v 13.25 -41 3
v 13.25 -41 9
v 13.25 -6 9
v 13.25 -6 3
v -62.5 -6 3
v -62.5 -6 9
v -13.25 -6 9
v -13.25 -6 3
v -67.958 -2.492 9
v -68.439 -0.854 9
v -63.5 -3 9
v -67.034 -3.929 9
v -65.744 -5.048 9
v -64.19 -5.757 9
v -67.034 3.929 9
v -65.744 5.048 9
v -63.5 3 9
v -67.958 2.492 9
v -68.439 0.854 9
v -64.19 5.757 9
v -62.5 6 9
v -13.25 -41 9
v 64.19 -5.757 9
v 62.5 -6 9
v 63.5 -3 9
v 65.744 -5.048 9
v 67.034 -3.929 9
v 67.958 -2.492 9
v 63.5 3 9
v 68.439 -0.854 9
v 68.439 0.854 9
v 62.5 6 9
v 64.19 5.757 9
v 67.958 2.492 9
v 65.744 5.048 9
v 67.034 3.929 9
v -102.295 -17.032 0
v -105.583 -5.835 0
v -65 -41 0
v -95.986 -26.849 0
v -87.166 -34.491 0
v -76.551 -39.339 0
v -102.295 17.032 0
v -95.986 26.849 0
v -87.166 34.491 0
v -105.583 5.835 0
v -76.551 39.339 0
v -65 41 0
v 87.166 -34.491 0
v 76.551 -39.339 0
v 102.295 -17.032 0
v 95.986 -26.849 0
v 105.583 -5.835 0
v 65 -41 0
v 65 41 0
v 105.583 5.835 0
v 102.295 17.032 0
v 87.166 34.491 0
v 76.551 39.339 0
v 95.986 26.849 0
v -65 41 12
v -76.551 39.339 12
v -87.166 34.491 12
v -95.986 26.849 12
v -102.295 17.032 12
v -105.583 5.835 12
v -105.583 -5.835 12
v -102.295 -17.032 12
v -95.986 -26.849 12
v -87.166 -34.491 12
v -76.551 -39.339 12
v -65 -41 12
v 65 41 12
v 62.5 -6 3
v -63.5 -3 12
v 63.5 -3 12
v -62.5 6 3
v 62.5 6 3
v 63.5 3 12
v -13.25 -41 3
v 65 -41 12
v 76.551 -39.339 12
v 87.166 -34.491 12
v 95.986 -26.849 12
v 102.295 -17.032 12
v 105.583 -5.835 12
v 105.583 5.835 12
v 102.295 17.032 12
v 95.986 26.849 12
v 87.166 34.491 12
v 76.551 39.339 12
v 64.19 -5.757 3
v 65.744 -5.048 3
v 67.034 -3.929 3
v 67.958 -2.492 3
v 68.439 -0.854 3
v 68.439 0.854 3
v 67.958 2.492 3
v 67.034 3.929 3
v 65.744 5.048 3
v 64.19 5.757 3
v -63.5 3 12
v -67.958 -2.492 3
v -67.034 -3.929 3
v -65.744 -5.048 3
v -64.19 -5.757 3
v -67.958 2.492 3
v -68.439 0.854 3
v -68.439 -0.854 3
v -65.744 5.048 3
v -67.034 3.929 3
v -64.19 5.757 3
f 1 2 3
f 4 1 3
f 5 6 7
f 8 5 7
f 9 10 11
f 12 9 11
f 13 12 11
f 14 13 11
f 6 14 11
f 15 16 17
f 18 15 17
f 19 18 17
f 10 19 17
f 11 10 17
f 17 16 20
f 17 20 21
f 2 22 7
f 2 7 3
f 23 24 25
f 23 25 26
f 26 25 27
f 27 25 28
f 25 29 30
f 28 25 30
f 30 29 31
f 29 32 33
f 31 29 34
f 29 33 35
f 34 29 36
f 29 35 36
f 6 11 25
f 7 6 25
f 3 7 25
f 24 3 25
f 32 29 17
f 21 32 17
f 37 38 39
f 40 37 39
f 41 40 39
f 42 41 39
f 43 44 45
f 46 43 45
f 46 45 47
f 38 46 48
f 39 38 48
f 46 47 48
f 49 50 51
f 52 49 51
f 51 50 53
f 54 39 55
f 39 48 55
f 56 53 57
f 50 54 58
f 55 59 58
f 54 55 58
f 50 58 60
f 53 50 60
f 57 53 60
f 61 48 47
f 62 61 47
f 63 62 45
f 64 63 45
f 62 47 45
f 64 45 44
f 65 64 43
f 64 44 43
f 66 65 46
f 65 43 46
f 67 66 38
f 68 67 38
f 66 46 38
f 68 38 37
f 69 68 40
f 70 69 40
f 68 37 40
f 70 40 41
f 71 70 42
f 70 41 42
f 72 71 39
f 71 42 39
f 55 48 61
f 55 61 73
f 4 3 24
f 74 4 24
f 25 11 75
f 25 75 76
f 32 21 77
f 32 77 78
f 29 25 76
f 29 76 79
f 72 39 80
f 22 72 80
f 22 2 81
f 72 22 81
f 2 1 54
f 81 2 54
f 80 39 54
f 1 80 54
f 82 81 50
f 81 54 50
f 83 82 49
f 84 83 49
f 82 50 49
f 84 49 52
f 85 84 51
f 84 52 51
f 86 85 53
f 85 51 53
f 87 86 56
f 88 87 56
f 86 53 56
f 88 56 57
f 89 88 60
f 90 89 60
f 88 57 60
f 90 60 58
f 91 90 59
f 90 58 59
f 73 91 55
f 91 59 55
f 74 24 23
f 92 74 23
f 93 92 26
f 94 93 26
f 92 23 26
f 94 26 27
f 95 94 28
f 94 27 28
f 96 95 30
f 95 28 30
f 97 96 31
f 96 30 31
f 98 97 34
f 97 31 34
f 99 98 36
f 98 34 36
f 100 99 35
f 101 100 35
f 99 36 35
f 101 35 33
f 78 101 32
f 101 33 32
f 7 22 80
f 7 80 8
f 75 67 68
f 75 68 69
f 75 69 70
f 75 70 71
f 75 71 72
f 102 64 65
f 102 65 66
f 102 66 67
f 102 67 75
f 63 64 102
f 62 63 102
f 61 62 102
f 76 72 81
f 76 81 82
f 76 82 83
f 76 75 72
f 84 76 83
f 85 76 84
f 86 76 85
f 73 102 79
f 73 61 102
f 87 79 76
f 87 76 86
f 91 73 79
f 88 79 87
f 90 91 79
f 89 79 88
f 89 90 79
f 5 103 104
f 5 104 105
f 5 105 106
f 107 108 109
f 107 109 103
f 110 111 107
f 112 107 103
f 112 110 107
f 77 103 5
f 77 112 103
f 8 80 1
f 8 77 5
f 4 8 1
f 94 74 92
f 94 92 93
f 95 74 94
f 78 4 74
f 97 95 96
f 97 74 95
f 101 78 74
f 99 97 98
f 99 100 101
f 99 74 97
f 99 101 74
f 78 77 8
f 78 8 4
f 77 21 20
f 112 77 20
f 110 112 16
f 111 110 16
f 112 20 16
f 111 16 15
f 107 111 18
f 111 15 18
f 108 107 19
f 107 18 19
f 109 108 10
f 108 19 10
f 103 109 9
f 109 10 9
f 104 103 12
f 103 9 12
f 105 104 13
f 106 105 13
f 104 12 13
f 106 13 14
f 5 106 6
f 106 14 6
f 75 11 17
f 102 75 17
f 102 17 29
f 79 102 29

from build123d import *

# Parameters (mm, degrees)
PAD_DEPTH       = 9
POCKET_DEPTH    = 6
SKETCH002_W     = 26.5
SKETCH002_H     = 35
POCKET001_DEPTH = 6
SKETCH003_W     = 127
SKETCH003_H     = 6
PAD001_DEPTH    = 3


with BuildPart() as part:
    # Sketch → Pad (new body)
    with BuildSketch(Plane.XY):
        with BuildLine():
            ThreePointArc((-65, 41), (-106, 0), (-65, -41))
            Line((-65, -41), (65, -41))
            ThreePointArc((65, -41), (106, 0), (65, 41))
            Line((-65, 41), (65, 41))
        make_face()
    extrude(amount=PAD_DEPTH)

    # Sketch001 (on Face6 of Pad) → Pocket (cut)
    with BuildSketch(Plane.XY.offset(9)):
        with BuildLine():
            ThreePointArc((-62.5, 6), (-68.5, 0), (-62.5, -6))
            Line((-62.5, -6), (62.5, -6))
            ThreePointArc((62.5, -6), (68.5, 0), (62.5, 6))
            Line((-62.5, 6), (62.5, 6))
        make_face()
    extrude(amount=-POCKET_DEPTH, mode=Mode.SUBTRACT)

    # Sketch002 (on Face5 of Pocket) → Pocket001 (cut)
    with BuildSketch(Plane.XY.offset(9)):
        with Locations((0, -23.5)):
            Rectangle(SKETCH002_W, SKETCH002_H)
    extrude(amount=-POCKET001_DEPTH, mode=Mode.SUBTRACT)

    # Sketch003 (on Face5 of Pocket001) → Pad001 (join)
    with BuildSketch(Plane.XY.offset(9)):
        with BuildLine():
            ThreePointArc((-65, 41), (-106, 0), (-65, -41))
            Line((-65, -41), (65, -41))
            ThreePointArc((65, -41), (106, 0), (65, 41))
            Line((-65, 41), (65, 41))
        make_face()
        Rectangle(SKETCH003_W, SKETCH003_H, mode=Mode.SUBTRACT)
    extrude(amount=PAD001_DEPTH)


solid = part.part
